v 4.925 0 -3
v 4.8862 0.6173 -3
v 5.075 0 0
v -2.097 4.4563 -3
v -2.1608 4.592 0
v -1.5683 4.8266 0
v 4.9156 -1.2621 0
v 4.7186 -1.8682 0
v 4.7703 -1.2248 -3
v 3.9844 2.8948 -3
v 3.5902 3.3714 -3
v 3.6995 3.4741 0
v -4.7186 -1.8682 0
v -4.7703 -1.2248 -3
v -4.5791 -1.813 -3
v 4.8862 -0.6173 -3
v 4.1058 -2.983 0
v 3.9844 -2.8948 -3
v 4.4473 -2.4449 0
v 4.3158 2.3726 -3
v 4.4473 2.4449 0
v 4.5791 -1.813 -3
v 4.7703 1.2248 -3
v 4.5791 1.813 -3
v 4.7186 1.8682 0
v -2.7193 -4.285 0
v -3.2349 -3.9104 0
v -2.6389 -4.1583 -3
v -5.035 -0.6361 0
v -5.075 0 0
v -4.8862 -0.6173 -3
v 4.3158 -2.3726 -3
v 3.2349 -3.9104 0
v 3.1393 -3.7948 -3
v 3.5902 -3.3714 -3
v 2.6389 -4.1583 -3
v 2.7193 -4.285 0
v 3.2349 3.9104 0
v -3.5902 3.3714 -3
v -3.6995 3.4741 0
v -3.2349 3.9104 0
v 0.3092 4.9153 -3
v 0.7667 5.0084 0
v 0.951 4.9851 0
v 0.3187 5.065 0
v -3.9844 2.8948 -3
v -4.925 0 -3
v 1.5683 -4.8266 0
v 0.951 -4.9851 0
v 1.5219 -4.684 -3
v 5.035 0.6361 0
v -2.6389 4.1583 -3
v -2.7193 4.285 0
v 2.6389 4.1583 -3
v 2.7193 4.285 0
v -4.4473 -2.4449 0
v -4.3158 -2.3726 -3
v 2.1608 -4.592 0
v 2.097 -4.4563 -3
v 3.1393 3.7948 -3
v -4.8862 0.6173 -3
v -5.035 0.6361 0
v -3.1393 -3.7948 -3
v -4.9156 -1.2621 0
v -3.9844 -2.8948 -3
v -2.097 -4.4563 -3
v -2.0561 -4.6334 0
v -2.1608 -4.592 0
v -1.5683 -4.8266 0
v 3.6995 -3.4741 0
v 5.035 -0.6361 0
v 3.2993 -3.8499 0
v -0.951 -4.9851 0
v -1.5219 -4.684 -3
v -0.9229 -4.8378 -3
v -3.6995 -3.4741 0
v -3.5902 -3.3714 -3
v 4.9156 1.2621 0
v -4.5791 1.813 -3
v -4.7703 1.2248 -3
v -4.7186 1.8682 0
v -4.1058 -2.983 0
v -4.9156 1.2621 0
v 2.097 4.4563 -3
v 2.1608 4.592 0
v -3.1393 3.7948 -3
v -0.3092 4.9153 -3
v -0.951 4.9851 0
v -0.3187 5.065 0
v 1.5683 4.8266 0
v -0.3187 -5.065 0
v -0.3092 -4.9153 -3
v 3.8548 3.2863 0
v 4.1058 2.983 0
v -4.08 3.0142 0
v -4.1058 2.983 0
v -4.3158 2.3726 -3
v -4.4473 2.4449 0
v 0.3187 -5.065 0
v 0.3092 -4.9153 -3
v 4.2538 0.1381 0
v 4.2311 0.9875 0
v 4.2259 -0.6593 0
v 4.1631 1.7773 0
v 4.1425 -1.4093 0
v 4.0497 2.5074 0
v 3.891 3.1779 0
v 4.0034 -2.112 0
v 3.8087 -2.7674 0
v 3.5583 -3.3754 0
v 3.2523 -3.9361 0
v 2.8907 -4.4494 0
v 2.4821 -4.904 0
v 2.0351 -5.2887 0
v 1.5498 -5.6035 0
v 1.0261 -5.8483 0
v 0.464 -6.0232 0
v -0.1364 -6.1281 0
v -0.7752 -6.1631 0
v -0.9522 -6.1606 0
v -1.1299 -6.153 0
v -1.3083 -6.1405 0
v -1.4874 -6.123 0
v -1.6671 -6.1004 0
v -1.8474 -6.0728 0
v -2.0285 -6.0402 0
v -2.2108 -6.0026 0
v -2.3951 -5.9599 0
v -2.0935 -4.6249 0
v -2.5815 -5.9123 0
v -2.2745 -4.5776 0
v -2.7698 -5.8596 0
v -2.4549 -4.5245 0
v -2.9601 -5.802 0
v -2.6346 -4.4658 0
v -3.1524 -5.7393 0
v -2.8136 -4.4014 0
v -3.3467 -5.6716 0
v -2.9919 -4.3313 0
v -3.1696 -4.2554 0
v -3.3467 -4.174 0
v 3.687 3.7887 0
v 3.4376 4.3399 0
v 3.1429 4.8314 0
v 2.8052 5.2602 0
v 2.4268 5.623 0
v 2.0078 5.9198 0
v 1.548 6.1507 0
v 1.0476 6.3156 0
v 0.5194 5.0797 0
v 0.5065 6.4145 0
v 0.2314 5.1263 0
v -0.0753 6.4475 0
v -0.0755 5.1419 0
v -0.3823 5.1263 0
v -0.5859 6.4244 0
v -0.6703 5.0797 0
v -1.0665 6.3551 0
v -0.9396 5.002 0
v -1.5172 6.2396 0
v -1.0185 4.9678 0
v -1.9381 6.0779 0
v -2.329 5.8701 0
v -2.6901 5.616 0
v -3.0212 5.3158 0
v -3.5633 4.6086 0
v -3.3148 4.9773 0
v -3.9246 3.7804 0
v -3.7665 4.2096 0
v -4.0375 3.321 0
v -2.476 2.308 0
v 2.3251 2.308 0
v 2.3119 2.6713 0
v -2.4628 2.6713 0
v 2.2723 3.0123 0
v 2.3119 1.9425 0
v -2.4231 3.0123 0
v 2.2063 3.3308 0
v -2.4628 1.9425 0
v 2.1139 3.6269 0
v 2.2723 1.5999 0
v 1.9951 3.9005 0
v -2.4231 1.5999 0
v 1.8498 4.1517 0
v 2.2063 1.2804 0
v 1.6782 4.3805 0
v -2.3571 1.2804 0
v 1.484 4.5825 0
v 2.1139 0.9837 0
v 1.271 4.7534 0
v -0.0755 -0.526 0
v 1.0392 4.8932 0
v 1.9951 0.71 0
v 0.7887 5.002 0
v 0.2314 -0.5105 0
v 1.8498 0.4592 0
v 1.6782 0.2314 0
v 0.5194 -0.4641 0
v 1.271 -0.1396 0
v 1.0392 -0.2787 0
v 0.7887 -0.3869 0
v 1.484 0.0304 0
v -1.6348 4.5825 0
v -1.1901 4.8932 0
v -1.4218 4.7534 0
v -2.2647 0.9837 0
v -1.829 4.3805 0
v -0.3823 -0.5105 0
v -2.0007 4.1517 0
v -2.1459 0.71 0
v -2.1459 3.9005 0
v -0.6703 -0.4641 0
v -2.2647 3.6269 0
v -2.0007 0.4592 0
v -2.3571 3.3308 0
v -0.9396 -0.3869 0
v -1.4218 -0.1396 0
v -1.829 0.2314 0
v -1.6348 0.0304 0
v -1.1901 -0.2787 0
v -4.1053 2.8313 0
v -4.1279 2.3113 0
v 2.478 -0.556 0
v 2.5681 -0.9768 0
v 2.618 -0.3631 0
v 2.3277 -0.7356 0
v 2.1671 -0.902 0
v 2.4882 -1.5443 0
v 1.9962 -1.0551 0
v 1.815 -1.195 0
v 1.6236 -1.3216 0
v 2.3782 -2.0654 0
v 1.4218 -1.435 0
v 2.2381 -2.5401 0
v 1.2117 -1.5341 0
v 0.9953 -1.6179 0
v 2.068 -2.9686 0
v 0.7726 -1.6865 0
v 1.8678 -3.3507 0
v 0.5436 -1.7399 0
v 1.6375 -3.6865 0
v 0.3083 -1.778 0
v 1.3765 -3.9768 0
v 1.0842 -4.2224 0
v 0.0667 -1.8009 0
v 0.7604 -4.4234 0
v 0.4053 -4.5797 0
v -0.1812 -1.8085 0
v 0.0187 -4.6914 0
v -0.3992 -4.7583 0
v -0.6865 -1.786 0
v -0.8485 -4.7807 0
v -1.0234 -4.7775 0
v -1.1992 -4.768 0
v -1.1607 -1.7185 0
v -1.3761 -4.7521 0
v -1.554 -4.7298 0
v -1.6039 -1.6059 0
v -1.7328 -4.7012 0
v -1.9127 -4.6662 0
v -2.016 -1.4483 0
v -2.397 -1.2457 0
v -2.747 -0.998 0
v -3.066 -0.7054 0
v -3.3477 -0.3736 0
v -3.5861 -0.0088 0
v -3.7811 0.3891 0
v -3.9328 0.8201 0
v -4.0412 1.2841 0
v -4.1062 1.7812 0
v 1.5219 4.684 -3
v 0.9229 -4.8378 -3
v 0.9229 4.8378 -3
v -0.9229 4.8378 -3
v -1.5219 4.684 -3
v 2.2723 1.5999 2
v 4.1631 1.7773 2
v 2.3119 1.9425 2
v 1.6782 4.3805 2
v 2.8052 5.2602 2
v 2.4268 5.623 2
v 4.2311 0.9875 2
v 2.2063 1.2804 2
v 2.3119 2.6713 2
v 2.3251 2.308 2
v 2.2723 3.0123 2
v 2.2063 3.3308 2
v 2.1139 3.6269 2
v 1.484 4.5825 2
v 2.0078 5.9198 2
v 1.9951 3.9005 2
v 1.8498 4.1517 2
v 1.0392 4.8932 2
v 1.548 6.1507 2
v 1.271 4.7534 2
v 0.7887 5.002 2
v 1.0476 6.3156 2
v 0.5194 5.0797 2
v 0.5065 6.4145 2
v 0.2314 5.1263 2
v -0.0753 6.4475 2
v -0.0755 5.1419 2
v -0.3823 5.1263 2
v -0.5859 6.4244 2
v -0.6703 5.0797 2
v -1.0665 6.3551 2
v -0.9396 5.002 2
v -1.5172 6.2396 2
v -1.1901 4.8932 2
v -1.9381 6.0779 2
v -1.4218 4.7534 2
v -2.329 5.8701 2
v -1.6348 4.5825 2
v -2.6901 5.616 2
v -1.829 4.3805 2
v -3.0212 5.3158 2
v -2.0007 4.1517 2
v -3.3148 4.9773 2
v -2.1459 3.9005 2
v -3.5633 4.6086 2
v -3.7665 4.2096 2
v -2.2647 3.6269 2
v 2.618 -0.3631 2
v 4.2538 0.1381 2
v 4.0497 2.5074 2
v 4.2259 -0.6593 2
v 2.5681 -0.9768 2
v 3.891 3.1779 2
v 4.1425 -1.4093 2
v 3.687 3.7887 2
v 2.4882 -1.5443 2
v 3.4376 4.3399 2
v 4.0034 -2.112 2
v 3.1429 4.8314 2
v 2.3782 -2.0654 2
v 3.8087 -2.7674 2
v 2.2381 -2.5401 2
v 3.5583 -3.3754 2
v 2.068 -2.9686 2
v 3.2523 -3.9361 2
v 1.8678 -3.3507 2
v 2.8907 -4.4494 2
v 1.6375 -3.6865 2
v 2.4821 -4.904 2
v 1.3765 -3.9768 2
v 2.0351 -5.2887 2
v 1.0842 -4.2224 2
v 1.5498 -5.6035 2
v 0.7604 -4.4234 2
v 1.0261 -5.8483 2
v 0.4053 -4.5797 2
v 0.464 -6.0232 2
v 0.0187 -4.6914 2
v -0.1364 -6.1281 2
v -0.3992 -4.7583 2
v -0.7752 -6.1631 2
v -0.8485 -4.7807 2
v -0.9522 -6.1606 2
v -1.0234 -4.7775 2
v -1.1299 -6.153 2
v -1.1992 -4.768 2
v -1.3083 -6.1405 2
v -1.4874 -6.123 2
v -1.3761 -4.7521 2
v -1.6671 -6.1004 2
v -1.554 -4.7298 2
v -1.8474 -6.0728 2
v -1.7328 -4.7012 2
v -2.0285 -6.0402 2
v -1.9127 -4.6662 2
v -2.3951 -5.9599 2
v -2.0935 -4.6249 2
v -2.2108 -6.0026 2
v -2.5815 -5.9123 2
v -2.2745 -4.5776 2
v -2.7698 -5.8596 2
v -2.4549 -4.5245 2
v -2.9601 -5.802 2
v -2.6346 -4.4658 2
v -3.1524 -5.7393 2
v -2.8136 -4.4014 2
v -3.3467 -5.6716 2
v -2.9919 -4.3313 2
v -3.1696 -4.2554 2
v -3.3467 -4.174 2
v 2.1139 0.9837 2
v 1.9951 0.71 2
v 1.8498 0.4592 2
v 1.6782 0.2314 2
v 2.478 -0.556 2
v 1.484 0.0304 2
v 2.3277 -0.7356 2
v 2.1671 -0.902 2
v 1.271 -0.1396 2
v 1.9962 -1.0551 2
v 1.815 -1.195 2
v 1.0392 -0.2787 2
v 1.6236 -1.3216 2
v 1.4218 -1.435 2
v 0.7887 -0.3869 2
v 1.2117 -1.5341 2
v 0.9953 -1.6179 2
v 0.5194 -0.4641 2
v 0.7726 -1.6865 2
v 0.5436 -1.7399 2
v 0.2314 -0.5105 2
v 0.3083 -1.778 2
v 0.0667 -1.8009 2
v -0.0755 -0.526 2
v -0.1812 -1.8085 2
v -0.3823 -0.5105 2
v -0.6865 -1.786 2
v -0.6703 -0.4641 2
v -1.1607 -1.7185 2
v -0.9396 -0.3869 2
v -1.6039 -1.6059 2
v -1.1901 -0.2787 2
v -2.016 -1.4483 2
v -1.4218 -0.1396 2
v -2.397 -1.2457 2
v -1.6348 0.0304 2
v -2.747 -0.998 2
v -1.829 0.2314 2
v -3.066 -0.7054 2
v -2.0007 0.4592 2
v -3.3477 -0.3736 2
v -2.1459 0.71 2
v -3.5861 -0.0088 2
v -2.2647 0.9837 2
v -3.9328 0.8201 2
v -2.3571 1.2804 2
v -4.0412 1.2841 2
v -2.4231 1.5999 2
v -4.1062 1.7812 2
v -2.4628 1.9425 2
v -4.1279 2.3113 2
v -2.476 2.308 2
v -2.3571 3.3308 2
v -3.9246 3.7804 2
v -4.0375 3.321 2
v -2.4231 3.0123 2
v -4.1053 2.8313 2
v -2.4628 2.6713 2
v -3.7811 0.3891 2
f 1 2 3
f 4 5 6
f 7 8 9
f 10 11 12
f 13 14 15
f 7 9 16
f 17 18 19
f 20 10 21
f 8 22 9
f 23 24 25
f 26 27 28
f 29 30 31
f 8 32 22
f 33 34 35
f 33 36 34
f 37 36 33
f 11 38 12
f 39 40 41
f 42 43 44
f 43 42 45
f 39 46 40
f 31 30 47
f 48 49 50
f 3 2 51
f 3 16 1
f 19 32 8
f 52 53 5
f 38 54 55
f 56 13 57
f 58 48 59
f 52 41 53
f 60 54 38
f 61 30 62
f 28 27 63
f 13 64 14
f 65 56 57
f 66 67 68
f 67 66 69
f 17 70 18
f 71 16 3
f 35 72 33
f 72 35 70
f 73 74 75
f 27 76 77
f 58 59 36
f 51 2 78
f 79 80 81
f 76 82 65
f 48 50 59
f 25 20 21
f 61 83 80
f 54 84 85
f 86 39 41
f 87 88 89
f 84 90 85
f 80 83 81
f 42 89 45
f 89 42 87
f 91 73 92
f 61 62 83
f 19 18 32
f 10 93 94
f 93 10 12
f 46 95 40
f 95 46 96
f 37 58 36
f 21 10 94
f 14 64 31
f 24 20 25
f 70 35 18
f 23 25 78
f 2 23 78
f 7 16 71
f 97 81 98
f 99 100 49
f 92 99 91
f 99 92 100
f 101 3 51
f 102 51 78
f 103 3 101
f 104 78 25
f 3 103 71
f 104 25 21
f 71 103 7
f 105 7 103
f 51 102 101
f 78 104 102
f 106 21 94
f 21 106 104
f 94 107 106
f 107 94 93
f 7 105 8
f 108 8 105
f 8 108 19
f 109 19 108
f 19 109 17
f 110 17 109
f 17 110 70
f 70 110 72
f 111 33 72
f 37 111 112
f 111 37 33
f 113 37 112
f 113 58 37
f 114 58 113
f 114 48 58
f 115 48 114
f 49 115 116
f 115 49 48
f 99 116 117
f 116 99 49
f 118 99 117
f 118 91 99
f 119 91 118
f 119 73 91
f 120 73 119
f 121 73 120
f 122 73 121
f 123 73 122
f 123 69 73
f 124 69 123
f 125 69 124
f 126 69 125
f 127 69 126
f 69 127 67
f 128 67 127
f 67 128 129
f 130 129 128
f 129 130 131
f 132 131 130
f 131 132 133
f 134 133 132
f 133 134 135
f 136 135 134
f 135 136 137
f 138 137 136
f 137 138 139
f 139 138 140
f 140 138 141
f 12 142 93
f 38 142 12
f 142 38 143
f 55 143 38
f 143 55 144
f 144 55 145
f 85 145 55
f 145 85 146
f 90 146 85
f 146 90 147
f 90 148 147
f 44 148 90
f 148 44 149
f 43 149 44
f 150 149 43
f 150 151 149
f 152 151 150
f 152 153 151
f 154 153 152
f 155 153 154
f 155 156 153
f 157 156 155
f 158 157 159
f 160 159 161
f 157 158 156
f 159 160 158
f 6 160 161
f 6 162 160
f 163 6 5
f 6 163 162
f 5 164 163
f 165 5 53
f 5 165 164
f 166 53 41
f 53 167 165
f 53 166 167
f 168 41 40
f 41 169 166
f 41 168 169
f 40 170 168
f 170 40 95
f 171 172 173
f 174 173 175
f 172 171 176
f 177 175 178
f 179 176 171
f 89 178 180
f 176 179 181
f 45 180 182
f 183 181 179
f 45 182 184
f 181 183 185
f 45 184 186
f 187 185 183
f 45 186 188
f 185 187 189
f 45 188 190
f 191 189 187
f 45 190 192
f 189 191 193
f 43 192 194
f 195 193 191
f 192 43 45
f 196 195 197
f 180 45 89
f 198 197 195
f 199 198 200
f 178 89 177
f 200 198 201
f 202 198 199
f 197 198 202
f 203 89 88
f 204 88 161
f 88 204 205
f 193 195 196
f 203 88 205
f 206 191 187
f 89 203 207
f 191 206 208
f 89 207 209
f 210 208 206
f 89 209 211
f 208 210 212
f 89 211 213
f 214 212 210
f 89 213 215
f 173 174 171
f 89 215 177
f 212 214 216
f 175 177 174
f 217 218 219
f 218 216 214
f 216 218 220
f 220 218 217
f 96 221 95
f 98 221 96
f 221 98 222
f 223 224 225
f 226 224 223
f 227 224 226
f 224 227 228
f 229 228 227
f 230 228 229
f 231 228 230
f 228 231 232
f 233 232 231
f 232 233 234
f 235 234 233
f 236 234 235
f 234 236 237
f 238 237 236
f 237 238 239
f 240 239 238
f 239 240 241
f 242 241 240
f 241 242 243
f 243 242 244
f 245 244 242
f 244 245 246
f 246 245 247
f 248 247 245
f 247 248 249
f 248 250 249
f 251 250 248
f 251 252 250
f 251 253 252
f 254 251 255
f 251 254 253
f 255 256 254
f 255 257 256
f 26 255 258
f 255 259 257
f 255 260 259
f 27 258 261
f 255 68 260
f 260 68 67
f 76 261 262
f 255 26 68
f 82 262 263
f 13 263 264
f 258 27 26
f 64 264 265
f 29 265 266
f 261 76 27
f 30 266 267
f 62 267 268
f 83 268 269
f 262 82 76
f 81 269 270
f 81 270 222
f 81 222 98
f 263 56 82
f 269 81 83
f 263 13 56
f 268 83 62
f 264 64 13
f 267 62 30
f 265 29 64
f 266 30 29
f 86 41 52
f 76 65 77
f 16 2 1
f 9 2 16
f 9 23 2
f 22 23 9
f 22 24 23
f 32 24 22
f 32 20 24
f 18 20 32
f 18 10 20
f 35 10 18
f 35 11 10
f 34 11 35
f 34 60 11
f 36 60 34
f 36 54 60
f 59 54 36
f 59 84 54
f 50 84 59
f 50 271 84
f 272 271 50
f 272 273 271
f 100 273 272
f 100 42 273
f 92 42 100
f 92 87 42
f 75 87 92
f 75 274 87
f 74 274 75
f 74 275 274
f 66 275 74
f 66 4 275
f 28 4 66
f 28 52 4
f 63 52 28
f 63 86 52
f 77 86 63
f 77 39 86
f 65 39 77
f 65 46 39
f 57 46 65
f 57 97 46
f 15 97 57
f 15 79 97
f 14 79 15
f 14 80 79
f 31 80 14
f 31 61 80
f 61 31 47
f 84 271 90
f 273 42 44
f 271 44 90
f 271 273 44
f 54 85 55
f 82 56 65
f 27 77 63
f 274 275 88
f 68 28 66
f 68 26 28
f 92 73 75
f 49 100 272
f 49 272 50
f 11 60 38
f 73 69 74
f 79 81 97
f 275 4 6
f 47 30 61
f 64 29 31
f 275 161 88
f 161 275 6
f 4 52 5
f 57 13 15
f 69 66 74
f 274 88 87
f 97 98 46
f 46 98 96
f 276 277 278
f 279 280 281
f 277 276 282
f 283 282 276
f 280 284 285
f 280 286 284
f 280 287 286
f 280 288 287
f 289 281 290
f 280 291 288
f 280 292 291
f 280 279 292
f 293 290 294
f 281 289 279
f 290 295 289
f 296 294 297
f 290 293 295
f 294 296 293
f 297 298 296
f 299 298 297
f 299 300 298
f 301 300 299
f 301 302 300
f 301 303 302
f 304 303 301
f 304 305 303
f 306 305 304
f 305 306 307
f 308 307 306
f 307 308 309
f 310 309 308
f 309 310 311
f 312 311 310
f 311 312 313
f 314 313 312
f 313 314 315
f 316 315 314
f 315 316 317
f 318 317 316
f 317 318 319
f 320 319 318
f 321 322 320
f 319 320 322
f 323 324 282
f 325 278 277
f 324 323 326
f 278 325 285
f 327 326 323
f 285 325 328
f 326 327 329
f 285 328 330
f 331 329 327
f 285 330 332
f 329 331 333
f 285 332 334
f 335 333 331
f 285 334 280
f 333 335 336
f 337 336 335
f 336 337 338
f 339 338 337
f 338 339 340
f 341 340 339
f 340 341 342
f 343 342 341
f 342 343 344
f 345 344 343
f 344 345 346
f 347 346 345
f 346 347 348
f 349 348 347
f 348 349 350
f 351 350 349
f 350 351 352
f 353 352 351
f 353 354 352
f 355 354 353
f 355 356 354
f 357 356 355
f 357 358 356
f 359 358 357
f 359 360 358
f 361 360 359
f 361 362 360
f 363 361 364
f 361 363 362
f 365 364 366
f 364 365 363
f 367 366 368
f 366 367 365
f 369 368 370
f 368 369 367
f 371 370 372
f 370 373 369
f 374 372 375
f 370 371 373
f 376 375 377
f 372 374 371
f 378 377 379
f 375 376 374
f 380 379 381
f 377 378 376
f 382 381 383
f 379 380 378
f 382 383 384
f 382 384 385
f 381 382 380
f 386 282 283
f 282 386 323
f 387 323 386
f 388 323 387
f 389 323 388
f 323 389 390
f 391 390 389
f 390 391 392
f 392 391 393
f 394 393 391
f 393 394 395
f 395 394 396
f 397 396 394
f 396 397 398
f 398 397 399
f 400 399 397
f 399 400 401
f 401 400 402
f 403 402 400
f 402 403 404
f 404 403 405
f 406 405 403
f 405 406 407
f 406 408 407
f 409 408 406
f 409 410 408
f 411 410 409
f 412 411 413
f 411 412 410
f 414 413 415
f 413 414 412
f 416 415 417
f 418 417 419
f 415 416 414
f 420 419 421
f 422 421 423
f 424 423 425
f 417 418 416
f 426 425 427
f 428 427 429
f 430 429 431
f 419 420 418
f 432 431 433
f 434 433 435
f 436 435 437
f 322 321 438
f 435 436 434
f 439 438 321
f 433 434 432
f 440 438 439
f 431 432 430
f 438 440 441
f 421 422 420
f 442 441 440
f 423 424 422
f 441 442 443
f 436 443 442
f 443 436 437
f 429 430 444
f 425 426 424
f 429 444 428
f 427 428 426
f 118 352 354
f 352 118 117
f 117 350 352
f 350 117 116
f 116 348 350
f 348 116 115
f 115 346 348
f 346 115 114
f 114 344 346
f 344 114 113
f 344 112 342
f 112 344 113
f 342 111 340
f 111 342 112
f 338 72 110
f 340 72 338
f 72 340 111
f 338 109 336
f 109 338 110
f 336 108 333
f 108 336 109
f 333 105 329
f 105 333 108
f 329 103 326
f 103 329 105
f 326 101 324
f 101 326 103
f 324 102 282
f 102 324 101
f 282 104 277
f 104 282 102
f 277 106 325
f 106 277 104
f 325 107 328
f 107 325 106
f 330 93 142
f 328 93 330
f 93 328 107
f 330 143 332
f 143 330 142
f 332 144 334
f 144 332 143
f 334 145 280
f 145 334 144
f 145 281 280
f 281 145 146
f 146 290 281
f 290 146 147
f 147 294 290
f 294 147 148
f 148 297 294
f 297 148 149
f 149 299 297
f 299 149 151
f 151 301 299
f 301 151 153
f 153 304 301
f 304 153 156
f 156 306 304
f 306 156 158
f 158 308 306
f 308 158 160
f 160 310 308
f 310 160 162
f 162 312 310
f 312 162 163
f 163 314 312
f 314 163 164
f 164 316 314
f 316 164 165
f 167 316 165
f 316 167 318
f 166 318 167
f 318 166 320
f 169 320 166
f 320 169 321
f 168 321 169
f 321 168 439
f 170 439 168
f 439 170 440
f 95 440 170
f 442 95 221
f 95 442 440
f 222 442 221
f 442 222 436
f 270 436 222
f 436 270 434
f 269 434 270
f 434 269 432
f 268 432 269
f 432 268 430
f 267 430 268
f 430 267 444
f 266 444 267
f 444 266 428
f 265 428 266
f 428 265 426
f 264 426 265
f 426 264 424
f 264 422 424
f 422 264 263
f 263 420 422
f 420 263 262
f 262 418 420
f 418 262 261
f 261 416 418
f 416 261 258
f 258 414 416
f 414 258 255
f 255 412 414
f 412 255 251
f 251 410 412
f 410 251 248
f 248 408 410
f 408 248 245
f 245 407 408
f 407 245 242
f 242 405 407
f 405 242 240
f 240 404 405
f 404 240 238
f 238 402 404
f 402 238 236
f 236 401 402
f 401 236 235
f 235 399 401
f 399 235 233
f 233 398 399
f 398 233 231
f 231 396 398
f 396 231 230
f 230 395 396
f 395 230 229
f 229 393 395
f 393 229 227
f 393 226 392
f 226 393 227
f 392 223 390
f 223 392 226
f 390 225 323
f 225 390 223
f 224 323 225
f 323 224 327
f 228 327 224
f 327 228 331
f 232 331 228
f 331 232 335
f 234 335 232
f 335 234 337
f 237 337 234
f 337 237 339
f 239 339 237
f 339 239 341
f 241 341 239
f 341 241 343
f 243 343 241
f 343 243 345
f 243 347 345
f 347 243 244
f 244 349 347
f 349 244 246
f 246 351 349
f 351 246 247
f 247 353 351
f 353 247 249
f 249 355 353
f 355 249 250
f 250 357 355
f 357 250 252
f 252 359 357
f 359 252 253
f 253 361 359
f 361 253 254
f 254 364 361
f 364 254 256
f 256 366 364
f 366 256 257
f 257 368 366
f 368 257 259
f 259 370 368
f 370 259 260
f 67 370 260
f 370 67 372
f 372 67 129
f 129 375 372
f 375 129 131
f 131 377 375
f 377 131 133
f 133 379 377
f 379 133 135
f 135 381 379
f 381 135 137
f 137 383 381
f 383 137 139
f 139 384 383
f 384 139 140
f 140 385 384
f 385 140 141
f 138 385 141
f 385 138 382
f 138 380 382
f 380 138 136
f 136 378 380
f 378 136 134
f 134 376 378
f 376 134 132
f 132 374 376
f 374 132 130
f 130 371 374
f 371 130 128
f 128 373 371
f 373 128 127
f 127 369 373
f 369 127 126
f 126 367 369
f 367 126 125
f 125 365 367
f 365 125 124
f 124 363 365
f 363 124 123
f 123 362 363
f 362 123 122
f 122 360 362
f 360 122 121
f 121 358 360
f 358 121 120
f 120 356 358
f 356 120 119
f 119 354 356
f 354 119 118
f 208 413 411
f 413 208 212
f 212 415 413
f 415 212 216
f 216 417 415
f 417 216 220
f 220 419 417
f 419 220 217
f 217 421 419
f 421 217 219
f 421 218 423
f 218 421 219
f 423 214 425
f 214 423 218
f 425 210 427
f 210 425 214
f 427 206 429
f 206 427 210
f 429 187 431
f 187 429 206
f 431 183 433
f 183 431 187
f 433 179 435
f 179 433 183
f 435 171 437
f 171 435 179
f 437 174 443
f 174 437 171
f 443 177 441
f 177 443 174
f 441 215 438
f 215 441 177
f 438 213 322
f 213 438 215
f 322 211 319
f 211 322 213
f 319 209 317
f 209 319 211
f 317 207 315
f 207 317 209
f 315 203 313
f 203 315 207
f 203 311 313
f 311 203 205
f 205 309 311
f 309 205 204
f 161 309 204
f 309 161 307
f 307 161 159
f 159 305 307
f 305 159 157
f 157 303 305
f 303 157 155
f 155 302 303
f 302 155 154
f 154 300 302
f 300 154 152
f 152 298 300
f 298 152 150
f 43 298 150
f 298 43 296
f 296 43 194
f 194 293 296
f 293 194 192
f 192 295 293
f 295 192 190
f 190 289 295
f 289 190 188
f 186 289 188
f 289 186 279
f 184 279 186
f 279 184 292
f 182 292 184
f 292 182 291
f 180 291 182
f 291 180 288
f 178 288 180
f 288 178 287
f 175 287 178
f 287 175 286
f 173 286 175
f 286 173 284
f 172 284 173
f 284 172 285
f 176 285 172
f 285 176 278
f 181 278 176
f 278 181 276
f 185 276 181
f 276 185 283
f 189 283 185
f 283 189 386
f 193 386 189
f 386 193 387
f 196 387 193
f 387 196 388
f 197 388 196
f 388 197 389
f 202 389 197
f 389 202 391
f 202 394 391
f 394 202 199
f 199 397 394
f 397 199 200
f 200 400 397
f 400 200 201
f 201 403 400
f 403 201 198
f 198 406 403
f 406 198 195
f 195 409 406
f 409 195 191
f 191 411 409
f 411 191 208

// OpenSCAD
$fn = 50;

difference() {
	union() {
		translate(v = [0, 0, -3.0]) {
			cylinder(h = 3, r1 = 4.925, r2 = 5.075);
		}
		linear_extrude(height = 2) {
			text(font = "Impact", halign = "center", size = 12, text = "9", valign = "center");
		}
	}
	union();
}
